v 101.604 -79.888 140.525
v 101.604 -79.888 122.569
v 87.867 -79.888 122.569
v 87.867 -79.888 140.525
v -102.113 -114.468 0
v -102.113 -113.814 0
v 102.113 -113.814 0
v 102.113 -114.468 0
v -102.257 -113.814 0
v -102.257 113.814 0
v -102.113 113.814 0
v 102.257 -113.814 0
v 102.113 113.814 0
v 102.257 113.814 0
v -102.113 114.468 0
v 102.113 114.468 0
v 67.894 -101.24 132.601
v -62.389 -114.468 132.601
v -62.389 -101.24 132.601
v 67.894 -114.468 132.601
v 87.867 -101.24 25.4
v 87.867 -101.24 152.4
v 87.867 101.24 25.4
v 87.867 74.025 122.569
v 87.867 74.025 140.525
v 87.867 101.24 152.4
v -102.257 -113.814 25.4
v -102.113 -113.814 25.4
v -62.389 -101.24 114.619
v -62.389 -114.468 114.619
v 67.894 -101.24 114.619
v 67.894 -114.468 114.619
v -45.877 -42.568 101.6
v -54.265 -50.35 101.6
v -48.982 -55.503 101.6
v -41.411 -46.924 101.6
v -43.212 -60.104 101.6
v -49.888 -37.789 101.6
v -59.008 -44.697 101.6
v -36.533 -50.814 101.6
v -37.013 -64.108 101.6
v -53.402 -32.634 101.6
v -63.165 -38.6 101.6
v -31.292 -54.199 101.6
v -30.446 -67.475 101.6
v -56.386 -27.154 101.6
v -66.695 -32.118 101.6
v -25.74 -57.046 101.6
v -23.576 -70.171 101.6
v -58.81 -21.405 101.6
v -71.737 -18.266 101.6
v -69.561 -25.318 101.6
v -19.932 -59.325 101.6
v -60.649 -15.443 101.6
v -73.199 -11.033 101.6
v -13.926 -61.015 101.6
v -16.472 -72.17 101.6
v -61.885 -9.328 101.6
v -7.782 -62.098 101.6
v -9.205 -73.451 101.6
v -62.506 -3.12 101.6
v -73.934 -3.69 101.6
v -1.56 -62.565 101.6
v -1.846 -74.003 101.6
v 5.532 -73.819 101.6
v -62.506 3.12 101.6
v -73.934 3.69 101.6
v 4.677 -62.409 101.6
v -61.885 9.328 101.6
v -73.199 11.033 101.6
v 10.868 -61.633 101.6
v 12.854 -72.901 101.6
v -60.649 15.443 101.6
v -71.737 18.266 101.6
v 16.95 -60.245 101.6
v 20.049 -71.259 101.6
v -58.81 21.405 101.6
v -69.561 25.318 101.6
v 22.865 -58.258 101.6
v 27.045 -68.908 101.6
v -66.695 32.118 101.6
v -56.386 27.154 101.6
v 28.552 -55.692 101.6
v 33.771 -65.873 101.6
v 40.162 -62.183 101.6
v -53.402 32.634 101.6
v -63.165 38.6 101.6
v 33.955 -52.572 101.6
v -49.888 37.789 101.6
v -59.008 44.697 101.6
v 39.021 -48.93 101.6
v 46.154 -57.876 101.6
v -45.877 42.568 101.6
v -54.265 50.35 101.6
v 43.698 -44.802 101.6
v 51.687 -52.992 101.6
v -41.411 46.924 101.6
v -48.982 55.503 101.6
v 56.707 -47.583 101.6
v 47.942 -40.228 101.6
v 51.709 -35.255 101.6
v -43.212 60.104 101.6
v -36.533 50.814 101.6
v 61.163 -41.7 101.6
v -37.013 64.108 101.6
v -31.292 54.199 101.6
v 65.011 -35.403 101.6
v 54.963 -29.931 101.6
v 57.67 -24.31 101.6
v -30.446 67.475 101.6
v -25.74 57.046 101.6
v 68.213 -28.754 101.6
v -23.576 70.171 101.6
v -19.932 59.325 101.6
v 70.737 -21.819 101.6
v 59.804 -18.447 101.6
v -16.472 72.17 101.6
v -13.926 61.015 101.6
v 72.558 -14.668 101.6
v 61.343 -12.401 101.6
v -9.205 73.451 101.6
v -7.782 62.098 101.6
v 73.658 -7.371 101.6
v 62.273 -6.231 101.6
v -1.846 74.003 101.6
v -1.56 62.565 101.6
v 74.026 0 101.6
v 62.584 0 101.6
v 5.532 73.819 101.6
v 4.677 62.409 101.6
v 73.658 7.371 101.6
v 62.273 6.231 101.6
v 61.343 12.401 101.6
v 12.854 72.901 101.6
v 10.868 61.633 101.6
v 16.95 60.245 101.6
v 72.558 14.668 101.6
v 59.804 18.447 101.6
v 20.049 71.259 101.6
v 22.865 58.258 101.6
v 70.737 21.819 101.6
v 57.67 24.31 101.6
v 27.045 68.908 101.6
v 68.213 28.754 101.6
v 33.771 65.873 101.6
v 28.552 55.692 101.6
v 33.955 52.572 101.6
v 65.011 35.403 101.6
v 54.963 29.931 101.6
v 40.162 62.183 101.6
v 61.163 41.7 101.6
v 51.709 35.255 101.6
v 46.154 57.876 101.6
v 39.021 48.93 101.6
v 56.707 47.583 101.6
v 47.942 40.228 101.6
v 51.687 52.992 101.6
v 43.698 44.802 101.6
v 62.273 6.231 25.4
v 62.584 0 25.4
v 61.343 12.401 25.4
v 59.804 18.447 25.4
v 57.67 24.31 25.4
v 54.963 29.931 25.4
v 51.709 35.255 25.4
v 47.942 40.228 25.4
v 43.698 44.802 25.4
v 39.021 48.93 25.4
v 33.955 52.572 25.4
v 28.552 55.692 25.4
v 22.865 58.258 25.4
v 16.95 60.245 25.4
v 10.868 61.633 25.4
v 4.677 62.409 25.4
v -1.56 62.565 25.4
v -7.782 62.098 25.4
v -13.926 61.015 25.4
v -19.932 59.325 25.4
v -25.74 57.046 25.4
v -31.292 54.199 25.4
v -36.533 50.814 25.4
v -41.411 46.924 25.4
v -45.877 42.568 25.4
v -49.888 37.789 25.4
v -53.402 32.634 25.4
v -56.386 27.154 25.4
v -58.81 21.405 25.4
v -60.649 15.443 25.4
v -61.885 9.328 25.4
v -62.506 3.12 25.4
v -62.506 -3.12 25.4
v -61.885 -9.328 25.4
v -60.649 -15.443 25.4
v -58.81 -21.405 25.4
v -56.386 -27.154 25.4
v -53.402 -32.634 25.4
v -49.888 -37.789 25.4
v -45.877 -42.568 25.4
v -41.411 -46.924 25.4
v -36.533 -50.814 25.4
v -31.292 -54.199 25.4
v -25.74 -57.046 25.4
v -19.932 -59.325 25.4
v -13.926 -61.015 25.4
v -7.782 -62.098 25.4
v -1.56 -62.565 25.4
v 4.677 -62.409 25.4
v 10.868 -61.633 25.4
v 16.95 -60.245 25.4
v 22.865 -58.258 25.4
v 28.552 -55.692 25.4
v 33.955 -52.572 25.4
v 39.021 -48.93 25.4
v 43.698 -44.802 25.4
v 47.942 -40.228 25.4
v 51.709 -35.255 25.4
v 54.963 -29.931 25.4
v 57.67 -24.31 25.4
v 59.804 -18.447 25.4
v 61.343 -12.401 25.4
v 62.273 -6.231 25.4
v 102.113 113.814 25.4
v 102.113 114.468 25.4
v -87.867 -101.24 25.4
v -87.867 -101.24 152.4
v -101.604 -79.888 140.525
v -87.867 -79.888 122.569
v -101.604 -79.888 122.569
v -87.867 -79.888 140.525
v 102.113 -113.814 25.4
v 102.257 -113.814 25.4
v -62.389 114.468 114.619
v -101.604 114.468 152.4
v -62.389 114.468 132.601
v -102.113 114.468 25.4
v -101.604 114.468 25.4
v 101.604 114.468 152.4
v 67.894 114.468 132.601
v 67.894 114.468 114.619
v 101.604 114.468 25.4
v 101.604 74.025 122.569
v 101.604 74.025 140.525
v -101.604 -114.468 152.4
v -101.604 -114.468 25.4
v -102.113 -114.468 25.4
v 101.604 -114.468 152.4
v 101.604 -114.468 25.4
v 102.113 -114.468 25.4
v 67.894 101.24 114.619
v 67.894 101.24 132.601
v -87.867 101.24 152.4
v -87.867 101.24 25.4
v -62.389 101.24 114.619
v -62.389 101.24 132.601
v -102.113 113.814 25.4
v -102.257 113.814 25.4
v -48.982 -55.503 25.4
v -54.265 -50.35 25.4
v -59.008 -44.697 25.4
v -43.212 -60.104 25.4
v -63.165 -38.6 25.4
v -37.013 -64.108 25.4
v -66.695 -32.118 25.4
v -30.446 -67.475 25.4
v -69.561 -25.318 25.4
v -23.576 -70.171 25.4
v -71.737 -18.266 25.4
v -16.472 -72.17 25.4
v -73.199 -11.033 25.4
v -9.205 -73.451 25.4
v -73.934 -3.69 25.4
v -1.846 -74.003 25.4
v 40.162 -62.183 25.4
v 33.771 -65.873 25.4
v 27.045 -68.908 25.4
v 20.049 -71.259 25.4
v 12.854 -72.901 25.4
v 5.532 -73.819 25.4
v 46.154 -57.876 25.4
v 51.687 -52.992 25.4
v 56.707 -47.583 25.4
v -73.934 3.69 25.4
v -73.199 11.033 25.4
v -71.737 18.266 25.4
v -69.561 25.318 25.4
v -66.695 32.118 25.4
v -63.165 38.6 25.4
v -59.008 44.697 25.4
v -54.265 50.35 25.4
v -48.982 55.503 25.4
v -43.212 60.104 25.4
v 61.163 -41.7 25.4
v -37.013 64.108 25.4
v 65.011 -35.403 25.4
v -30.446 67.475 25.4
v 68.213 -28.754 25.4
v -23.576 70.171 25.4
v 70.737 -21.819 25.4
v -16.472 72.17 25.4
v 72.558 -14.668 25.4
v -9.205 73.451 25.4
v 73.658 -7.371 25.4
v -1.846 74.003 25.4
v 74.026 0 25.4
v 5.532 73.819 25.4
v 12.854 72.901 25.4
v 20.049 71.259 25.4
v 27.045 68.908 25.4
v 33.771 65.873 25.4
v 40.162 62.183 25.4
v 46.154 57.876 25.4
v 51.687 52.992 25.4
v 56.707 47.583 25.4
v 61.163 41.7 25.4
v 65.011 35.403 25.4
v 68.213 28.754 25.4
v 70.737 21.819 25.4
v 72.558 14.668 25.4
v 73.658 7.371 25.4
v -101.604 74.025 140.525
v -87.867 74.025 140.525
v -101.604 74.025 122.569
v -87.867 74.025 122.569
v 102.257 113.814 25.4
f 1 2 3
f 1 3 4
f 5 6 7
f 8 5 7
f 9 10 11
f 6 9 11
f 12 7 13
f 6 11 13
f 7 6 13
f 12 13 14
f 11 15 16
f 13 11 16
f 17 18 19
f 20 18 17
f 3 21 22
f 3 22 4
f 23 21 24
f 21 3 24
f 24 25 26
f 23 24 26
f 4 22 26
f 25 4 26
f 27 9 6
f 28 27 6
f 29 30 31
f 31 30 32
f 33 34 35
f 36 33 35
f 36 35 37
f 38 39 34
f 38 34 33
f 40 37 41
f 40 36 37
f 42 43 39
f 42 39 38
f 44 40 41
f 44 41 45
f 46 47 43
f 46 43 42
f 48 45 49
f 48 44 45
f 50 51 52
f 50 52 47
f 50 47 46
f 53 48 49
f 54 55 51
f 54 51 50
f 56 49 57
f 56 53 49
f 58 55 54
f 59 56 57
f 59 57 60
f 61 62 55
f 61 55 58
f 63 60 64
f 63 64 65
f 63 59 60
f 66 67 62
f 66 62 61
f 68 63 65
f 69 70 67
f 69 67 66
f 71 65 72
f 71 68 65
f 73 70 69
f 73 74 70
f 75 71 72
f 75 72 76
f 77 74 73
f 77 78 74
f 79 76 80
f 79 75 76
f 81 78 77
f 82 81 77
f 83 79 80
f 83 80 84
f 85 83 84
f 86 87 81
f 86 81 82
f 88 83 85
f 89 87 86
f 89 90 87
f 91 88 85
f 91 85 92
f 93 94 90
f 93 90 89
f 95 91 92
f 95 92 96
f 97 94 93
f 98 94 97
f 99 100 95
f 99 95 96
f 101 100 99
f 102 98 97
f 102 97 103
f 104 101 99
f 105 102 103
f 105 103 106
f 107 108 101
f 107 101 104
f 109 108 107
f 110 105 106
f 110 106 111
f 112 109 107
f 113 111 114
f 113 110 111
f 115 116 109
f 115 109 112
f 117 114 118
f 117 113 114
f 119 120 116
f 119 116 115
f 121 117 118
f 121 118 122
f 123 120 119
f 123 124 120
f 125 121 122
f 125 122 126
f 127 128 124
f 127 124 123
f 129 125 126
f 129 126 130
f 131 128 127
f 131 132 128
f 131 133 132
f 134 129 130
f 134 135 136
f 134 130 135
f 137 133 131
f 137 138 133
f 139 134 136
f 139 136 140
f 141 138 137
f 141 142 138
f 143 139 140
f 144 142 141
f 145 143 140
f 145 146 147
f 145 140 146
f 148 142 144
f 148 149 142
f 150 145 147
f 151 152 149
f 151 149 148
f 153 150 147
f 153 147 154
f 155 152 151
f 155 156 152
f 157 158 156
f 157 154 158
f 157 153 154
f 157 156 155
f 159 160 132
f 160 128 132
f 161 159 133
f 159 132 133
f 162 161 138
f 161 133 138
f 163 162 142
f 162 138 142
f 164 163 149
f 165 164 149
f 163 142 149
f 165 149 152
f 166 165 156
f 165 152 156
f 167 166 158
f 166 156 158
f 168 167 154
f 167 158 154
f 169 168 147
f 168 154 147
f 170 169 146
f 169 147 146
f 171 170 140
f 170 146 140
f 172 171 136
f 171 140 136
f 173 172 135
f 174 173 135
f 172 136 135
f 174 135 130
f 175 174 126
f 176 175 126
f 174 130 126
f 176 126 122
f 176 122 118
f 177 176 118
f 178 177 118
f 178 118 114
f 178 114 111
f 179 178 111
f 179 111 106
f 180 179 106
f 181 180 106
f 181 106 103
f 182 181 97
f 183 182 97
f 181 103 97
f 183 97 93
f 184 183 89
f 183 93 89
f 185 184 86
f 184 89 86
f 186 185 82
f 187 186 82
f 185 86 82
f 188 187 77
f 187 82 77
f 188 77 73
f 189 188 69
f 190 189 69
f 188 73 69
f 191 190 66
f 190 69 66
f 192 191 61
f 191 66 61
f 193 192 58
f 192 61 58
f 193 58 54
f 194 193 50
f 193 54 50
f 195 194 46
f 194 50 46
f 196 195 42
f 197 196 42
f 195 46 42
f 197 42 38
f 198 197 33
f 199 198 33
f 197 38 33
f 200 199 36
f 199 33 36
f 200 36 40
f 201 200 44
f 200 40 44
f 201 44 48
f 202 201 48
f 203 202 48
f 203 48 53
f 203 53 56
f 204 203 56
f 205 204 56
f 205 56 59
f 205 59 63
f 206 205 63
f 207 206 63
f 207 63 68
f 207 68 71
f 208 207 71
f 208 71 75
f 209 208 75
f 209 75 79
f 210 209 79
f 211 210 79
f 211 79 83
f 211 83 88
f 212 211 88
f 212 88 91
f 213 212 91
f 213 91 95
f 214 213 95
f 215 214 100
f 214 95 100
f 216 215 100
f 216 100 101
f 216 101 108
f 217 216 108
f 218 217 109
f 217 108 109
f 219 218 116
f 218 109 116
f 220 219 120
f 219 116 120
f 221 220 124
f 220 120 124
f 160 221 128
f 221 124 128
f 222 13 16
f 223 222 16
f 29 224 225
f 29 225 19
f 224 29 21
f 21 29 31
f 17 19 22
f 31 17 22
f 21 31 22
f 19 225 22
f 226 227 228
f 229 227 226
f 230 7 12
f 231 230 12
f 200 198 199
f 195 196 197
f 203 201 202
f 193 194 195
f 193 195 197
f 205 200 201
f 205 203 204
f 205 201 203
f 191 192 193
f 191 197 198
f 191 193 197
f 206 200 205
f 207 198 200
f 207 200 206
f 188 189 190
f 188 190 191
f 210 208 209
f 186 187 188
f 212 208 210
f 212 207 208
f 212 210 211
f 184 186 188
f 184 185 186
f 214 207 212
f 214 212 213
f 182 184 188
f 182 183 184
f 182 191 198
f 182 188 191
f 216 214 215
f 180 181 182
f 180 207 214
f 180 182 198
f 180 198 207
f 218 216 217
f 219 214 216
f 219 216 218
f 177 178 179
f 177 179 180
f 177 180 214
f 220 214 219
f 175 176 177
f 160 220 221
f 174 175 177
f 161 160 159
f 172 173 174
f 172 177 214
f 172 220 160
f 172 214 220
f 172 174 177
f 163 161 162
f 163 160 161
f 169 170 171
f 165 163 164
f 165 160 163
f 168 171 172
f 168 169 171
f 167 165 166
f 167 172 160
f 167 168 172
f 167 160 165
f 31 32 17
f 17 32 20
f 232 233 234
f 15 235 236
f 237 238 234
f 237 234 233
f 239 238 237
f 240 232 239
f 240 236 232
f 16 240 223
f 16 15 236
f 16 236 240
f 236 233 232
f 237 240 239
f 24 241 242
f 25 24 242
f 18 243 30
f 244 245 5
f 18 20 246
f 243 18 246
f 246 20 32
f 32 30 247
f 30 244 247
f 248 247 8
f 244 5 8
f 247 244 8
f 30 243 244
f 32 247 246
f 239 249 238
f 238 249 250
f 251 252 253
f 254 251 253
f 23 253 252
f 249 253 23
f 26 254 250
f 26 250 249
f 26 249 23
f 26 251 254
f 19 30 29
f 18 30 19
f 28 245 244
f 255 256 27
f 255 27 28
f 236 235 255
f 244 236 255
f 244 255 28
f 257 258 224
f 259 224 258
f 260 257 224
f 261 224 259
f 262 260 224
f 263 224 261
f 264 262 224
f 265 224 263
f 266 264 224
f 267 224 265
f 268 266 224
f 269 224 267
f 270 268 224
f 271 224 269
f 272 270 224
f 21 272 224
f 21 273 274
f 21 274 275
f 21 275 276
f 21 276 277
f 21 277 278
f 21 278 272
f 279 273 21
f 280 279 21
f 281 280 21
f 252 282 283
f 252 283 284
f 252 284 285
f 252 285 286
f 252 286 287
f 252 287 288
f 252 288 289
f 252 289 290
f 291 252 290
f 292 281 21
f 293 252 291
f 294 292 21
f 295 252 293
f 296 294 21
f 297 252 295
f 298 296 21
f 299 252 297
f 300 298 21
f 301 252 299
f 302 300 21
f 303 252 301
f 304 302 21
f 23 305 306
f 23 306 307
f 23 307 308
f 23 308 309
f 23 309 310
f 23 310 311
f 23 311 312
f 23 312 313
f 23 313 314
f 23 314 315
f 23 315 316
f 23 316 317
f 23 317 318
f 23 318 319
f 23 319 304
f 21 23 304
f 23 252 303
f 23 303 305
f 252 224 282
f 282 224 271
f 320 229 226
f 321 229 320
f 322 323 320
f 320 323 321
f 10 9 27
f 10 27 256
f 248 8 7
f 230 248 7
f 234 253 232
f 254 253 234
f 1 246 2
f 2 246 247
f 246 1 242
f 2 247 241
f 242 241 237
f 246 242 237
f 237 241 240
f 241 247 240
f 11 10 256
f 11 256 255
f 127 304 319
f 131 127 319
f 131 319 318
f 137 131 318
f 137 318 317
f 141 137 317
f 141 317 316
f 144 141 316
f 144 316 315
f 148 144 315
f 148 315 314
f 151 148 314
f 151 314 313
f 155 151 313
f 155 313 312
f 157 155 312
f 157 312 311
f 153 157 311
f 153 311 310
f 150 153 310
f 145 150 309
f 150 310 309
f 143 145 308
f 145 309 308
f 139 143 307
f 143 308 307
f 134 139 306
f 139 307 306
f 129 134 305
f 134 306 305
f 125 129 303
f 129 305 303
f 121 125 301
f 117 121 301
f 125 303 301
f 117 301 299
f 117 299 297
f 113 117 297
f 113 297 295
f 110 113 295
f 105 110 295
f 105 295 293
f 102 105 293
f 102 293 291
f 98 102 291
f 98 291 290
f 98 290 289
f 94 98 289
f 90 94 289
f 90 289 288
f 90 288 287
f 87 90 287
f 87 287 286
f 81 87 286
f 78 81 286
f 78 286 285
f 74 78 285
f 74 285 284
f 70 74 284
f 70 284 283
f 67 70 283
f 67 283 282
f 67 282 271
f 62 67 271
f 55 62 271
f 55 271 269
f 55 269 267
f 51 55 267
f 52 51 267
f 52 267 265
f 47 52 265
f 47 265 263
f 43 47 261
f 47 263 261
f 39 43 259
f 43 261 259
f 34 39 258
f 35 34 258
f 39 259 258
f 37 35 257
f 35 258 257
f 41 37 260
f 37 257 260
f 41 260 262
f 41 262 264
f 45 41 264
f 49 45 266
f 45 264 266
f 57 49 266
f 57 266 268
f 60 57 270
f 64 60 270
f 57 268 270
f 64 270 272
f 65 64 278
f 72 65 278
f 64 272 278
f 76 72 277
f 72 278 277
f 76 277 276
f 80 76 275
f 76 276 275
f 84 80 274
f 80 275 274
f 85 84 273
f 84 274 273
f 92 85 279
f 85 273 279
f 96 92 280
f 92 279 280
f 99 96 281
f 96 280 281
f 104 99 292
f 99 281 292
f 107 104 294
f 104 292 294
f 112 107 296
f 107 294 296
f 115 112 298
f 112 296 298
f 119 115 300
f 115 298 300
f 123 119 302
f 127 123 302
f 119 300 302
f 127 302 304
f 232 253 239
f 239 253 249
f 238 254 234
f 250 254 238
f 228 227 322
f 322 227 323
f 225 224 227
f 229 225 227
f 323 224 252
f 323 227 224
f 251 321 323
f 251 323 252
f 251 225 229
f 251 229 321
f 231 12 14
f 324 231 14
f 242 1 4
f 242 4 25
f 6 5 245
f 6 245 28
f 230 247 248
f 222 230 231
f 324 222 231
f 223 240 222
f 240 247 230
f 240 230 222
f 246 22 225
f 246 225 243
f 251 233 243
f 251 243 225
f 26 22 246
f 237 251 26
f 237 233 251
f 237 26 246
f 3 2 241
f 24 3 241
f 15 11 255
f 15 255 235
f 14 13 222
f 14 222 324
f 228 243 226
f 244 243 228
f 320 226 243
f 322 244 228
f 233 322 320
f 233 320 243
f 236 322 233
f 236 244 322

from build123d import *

# Parameters (mm, degrees)
F0_W      = 203.207492
F0_H      = 228.935466
F1_DEPTH  = 152.4
F2_W      = 175.73382
F2_H      = 202.479318
F3_DEPTH  = 1270
F4_W      = 204.225034
F4_H      = 228.935466
F5_DEPTH  = 25.4
F6_R      = 74.025585
F7_DEPTH  = 101.6
F8_R      = 62.584058
F9_DEPTH  = 12700
F10_W     = 204.514414
F10_H     = 227.628558
F11_DEPTH = 25.4
F12_W     = 130.283504
F12_H     = 17.982788
F13_DEPTH = 12700
F14_W     = 153.912366
F14_H     = 17.956443
F15_DEPTH = 127000


with BuildPart() as f1:
    # F0 (on Top) → F1 (new body)
    with BuildSketch(Plane.XY):
        Rectangle(F0_W, F0_H)
    extrude(amount=F1_DEPTH)

    # F2 (on Top) → F3 (cut, symmetric)
    with BuildSketch(Plane.XY):
        Rectangle(F2_W, F2_H)
    extrude(amount=F3_DEPTH, both=True, mode=Mode.SUBTRACT)

    # F4 (on Top) → F5 (join)
    with BuildSketch(Plane.XY):
        Rectangle(F4_W, F4_H)
    extrude(amount=F5_DEPTH)

    # F6 (on Top) → F7 (join)
    with BuildSketch(Plane.XY):
        Circle(F6_R)
    extrude(amount=F7_DEPTH)

    # F8 (on Top) → F9 (cut, symmetric)
    with BuildSketch(Plane.XY):
        Circle(F8_R)
    extrude(amount=F9_DEPTH, both=True, mode=Mode.SUBTRACT)

    # F10 (on Top) → F11 (join)
    with BuildSketch(Plane.XY):
        Rectangle(F10_W, F10_H)
    extrude(amount=F11_DEPTH)

    # F12 (on Front) → F13 (cut, symmetric)
    with BuildSketch(Plane.XZ):
        with Locations((2.752468, 123.610016)):
            Rectangle(F12_W, F12_H)
    extrude(amount=F13_DEPTH, both=True, mode=Mode.SUBTRACT)

    # F14 (on Right) → F15 (cut, symmetric)
    with BuildSketch(Plane.YZ):
        with Locations((-2.931662, 131.546791)):
            Rectangle(F14_W, F14_H)
    extrude(amount=F15_DEPTH, both=True, mode=Mode.SUBTRACT)


solid = f1.part
